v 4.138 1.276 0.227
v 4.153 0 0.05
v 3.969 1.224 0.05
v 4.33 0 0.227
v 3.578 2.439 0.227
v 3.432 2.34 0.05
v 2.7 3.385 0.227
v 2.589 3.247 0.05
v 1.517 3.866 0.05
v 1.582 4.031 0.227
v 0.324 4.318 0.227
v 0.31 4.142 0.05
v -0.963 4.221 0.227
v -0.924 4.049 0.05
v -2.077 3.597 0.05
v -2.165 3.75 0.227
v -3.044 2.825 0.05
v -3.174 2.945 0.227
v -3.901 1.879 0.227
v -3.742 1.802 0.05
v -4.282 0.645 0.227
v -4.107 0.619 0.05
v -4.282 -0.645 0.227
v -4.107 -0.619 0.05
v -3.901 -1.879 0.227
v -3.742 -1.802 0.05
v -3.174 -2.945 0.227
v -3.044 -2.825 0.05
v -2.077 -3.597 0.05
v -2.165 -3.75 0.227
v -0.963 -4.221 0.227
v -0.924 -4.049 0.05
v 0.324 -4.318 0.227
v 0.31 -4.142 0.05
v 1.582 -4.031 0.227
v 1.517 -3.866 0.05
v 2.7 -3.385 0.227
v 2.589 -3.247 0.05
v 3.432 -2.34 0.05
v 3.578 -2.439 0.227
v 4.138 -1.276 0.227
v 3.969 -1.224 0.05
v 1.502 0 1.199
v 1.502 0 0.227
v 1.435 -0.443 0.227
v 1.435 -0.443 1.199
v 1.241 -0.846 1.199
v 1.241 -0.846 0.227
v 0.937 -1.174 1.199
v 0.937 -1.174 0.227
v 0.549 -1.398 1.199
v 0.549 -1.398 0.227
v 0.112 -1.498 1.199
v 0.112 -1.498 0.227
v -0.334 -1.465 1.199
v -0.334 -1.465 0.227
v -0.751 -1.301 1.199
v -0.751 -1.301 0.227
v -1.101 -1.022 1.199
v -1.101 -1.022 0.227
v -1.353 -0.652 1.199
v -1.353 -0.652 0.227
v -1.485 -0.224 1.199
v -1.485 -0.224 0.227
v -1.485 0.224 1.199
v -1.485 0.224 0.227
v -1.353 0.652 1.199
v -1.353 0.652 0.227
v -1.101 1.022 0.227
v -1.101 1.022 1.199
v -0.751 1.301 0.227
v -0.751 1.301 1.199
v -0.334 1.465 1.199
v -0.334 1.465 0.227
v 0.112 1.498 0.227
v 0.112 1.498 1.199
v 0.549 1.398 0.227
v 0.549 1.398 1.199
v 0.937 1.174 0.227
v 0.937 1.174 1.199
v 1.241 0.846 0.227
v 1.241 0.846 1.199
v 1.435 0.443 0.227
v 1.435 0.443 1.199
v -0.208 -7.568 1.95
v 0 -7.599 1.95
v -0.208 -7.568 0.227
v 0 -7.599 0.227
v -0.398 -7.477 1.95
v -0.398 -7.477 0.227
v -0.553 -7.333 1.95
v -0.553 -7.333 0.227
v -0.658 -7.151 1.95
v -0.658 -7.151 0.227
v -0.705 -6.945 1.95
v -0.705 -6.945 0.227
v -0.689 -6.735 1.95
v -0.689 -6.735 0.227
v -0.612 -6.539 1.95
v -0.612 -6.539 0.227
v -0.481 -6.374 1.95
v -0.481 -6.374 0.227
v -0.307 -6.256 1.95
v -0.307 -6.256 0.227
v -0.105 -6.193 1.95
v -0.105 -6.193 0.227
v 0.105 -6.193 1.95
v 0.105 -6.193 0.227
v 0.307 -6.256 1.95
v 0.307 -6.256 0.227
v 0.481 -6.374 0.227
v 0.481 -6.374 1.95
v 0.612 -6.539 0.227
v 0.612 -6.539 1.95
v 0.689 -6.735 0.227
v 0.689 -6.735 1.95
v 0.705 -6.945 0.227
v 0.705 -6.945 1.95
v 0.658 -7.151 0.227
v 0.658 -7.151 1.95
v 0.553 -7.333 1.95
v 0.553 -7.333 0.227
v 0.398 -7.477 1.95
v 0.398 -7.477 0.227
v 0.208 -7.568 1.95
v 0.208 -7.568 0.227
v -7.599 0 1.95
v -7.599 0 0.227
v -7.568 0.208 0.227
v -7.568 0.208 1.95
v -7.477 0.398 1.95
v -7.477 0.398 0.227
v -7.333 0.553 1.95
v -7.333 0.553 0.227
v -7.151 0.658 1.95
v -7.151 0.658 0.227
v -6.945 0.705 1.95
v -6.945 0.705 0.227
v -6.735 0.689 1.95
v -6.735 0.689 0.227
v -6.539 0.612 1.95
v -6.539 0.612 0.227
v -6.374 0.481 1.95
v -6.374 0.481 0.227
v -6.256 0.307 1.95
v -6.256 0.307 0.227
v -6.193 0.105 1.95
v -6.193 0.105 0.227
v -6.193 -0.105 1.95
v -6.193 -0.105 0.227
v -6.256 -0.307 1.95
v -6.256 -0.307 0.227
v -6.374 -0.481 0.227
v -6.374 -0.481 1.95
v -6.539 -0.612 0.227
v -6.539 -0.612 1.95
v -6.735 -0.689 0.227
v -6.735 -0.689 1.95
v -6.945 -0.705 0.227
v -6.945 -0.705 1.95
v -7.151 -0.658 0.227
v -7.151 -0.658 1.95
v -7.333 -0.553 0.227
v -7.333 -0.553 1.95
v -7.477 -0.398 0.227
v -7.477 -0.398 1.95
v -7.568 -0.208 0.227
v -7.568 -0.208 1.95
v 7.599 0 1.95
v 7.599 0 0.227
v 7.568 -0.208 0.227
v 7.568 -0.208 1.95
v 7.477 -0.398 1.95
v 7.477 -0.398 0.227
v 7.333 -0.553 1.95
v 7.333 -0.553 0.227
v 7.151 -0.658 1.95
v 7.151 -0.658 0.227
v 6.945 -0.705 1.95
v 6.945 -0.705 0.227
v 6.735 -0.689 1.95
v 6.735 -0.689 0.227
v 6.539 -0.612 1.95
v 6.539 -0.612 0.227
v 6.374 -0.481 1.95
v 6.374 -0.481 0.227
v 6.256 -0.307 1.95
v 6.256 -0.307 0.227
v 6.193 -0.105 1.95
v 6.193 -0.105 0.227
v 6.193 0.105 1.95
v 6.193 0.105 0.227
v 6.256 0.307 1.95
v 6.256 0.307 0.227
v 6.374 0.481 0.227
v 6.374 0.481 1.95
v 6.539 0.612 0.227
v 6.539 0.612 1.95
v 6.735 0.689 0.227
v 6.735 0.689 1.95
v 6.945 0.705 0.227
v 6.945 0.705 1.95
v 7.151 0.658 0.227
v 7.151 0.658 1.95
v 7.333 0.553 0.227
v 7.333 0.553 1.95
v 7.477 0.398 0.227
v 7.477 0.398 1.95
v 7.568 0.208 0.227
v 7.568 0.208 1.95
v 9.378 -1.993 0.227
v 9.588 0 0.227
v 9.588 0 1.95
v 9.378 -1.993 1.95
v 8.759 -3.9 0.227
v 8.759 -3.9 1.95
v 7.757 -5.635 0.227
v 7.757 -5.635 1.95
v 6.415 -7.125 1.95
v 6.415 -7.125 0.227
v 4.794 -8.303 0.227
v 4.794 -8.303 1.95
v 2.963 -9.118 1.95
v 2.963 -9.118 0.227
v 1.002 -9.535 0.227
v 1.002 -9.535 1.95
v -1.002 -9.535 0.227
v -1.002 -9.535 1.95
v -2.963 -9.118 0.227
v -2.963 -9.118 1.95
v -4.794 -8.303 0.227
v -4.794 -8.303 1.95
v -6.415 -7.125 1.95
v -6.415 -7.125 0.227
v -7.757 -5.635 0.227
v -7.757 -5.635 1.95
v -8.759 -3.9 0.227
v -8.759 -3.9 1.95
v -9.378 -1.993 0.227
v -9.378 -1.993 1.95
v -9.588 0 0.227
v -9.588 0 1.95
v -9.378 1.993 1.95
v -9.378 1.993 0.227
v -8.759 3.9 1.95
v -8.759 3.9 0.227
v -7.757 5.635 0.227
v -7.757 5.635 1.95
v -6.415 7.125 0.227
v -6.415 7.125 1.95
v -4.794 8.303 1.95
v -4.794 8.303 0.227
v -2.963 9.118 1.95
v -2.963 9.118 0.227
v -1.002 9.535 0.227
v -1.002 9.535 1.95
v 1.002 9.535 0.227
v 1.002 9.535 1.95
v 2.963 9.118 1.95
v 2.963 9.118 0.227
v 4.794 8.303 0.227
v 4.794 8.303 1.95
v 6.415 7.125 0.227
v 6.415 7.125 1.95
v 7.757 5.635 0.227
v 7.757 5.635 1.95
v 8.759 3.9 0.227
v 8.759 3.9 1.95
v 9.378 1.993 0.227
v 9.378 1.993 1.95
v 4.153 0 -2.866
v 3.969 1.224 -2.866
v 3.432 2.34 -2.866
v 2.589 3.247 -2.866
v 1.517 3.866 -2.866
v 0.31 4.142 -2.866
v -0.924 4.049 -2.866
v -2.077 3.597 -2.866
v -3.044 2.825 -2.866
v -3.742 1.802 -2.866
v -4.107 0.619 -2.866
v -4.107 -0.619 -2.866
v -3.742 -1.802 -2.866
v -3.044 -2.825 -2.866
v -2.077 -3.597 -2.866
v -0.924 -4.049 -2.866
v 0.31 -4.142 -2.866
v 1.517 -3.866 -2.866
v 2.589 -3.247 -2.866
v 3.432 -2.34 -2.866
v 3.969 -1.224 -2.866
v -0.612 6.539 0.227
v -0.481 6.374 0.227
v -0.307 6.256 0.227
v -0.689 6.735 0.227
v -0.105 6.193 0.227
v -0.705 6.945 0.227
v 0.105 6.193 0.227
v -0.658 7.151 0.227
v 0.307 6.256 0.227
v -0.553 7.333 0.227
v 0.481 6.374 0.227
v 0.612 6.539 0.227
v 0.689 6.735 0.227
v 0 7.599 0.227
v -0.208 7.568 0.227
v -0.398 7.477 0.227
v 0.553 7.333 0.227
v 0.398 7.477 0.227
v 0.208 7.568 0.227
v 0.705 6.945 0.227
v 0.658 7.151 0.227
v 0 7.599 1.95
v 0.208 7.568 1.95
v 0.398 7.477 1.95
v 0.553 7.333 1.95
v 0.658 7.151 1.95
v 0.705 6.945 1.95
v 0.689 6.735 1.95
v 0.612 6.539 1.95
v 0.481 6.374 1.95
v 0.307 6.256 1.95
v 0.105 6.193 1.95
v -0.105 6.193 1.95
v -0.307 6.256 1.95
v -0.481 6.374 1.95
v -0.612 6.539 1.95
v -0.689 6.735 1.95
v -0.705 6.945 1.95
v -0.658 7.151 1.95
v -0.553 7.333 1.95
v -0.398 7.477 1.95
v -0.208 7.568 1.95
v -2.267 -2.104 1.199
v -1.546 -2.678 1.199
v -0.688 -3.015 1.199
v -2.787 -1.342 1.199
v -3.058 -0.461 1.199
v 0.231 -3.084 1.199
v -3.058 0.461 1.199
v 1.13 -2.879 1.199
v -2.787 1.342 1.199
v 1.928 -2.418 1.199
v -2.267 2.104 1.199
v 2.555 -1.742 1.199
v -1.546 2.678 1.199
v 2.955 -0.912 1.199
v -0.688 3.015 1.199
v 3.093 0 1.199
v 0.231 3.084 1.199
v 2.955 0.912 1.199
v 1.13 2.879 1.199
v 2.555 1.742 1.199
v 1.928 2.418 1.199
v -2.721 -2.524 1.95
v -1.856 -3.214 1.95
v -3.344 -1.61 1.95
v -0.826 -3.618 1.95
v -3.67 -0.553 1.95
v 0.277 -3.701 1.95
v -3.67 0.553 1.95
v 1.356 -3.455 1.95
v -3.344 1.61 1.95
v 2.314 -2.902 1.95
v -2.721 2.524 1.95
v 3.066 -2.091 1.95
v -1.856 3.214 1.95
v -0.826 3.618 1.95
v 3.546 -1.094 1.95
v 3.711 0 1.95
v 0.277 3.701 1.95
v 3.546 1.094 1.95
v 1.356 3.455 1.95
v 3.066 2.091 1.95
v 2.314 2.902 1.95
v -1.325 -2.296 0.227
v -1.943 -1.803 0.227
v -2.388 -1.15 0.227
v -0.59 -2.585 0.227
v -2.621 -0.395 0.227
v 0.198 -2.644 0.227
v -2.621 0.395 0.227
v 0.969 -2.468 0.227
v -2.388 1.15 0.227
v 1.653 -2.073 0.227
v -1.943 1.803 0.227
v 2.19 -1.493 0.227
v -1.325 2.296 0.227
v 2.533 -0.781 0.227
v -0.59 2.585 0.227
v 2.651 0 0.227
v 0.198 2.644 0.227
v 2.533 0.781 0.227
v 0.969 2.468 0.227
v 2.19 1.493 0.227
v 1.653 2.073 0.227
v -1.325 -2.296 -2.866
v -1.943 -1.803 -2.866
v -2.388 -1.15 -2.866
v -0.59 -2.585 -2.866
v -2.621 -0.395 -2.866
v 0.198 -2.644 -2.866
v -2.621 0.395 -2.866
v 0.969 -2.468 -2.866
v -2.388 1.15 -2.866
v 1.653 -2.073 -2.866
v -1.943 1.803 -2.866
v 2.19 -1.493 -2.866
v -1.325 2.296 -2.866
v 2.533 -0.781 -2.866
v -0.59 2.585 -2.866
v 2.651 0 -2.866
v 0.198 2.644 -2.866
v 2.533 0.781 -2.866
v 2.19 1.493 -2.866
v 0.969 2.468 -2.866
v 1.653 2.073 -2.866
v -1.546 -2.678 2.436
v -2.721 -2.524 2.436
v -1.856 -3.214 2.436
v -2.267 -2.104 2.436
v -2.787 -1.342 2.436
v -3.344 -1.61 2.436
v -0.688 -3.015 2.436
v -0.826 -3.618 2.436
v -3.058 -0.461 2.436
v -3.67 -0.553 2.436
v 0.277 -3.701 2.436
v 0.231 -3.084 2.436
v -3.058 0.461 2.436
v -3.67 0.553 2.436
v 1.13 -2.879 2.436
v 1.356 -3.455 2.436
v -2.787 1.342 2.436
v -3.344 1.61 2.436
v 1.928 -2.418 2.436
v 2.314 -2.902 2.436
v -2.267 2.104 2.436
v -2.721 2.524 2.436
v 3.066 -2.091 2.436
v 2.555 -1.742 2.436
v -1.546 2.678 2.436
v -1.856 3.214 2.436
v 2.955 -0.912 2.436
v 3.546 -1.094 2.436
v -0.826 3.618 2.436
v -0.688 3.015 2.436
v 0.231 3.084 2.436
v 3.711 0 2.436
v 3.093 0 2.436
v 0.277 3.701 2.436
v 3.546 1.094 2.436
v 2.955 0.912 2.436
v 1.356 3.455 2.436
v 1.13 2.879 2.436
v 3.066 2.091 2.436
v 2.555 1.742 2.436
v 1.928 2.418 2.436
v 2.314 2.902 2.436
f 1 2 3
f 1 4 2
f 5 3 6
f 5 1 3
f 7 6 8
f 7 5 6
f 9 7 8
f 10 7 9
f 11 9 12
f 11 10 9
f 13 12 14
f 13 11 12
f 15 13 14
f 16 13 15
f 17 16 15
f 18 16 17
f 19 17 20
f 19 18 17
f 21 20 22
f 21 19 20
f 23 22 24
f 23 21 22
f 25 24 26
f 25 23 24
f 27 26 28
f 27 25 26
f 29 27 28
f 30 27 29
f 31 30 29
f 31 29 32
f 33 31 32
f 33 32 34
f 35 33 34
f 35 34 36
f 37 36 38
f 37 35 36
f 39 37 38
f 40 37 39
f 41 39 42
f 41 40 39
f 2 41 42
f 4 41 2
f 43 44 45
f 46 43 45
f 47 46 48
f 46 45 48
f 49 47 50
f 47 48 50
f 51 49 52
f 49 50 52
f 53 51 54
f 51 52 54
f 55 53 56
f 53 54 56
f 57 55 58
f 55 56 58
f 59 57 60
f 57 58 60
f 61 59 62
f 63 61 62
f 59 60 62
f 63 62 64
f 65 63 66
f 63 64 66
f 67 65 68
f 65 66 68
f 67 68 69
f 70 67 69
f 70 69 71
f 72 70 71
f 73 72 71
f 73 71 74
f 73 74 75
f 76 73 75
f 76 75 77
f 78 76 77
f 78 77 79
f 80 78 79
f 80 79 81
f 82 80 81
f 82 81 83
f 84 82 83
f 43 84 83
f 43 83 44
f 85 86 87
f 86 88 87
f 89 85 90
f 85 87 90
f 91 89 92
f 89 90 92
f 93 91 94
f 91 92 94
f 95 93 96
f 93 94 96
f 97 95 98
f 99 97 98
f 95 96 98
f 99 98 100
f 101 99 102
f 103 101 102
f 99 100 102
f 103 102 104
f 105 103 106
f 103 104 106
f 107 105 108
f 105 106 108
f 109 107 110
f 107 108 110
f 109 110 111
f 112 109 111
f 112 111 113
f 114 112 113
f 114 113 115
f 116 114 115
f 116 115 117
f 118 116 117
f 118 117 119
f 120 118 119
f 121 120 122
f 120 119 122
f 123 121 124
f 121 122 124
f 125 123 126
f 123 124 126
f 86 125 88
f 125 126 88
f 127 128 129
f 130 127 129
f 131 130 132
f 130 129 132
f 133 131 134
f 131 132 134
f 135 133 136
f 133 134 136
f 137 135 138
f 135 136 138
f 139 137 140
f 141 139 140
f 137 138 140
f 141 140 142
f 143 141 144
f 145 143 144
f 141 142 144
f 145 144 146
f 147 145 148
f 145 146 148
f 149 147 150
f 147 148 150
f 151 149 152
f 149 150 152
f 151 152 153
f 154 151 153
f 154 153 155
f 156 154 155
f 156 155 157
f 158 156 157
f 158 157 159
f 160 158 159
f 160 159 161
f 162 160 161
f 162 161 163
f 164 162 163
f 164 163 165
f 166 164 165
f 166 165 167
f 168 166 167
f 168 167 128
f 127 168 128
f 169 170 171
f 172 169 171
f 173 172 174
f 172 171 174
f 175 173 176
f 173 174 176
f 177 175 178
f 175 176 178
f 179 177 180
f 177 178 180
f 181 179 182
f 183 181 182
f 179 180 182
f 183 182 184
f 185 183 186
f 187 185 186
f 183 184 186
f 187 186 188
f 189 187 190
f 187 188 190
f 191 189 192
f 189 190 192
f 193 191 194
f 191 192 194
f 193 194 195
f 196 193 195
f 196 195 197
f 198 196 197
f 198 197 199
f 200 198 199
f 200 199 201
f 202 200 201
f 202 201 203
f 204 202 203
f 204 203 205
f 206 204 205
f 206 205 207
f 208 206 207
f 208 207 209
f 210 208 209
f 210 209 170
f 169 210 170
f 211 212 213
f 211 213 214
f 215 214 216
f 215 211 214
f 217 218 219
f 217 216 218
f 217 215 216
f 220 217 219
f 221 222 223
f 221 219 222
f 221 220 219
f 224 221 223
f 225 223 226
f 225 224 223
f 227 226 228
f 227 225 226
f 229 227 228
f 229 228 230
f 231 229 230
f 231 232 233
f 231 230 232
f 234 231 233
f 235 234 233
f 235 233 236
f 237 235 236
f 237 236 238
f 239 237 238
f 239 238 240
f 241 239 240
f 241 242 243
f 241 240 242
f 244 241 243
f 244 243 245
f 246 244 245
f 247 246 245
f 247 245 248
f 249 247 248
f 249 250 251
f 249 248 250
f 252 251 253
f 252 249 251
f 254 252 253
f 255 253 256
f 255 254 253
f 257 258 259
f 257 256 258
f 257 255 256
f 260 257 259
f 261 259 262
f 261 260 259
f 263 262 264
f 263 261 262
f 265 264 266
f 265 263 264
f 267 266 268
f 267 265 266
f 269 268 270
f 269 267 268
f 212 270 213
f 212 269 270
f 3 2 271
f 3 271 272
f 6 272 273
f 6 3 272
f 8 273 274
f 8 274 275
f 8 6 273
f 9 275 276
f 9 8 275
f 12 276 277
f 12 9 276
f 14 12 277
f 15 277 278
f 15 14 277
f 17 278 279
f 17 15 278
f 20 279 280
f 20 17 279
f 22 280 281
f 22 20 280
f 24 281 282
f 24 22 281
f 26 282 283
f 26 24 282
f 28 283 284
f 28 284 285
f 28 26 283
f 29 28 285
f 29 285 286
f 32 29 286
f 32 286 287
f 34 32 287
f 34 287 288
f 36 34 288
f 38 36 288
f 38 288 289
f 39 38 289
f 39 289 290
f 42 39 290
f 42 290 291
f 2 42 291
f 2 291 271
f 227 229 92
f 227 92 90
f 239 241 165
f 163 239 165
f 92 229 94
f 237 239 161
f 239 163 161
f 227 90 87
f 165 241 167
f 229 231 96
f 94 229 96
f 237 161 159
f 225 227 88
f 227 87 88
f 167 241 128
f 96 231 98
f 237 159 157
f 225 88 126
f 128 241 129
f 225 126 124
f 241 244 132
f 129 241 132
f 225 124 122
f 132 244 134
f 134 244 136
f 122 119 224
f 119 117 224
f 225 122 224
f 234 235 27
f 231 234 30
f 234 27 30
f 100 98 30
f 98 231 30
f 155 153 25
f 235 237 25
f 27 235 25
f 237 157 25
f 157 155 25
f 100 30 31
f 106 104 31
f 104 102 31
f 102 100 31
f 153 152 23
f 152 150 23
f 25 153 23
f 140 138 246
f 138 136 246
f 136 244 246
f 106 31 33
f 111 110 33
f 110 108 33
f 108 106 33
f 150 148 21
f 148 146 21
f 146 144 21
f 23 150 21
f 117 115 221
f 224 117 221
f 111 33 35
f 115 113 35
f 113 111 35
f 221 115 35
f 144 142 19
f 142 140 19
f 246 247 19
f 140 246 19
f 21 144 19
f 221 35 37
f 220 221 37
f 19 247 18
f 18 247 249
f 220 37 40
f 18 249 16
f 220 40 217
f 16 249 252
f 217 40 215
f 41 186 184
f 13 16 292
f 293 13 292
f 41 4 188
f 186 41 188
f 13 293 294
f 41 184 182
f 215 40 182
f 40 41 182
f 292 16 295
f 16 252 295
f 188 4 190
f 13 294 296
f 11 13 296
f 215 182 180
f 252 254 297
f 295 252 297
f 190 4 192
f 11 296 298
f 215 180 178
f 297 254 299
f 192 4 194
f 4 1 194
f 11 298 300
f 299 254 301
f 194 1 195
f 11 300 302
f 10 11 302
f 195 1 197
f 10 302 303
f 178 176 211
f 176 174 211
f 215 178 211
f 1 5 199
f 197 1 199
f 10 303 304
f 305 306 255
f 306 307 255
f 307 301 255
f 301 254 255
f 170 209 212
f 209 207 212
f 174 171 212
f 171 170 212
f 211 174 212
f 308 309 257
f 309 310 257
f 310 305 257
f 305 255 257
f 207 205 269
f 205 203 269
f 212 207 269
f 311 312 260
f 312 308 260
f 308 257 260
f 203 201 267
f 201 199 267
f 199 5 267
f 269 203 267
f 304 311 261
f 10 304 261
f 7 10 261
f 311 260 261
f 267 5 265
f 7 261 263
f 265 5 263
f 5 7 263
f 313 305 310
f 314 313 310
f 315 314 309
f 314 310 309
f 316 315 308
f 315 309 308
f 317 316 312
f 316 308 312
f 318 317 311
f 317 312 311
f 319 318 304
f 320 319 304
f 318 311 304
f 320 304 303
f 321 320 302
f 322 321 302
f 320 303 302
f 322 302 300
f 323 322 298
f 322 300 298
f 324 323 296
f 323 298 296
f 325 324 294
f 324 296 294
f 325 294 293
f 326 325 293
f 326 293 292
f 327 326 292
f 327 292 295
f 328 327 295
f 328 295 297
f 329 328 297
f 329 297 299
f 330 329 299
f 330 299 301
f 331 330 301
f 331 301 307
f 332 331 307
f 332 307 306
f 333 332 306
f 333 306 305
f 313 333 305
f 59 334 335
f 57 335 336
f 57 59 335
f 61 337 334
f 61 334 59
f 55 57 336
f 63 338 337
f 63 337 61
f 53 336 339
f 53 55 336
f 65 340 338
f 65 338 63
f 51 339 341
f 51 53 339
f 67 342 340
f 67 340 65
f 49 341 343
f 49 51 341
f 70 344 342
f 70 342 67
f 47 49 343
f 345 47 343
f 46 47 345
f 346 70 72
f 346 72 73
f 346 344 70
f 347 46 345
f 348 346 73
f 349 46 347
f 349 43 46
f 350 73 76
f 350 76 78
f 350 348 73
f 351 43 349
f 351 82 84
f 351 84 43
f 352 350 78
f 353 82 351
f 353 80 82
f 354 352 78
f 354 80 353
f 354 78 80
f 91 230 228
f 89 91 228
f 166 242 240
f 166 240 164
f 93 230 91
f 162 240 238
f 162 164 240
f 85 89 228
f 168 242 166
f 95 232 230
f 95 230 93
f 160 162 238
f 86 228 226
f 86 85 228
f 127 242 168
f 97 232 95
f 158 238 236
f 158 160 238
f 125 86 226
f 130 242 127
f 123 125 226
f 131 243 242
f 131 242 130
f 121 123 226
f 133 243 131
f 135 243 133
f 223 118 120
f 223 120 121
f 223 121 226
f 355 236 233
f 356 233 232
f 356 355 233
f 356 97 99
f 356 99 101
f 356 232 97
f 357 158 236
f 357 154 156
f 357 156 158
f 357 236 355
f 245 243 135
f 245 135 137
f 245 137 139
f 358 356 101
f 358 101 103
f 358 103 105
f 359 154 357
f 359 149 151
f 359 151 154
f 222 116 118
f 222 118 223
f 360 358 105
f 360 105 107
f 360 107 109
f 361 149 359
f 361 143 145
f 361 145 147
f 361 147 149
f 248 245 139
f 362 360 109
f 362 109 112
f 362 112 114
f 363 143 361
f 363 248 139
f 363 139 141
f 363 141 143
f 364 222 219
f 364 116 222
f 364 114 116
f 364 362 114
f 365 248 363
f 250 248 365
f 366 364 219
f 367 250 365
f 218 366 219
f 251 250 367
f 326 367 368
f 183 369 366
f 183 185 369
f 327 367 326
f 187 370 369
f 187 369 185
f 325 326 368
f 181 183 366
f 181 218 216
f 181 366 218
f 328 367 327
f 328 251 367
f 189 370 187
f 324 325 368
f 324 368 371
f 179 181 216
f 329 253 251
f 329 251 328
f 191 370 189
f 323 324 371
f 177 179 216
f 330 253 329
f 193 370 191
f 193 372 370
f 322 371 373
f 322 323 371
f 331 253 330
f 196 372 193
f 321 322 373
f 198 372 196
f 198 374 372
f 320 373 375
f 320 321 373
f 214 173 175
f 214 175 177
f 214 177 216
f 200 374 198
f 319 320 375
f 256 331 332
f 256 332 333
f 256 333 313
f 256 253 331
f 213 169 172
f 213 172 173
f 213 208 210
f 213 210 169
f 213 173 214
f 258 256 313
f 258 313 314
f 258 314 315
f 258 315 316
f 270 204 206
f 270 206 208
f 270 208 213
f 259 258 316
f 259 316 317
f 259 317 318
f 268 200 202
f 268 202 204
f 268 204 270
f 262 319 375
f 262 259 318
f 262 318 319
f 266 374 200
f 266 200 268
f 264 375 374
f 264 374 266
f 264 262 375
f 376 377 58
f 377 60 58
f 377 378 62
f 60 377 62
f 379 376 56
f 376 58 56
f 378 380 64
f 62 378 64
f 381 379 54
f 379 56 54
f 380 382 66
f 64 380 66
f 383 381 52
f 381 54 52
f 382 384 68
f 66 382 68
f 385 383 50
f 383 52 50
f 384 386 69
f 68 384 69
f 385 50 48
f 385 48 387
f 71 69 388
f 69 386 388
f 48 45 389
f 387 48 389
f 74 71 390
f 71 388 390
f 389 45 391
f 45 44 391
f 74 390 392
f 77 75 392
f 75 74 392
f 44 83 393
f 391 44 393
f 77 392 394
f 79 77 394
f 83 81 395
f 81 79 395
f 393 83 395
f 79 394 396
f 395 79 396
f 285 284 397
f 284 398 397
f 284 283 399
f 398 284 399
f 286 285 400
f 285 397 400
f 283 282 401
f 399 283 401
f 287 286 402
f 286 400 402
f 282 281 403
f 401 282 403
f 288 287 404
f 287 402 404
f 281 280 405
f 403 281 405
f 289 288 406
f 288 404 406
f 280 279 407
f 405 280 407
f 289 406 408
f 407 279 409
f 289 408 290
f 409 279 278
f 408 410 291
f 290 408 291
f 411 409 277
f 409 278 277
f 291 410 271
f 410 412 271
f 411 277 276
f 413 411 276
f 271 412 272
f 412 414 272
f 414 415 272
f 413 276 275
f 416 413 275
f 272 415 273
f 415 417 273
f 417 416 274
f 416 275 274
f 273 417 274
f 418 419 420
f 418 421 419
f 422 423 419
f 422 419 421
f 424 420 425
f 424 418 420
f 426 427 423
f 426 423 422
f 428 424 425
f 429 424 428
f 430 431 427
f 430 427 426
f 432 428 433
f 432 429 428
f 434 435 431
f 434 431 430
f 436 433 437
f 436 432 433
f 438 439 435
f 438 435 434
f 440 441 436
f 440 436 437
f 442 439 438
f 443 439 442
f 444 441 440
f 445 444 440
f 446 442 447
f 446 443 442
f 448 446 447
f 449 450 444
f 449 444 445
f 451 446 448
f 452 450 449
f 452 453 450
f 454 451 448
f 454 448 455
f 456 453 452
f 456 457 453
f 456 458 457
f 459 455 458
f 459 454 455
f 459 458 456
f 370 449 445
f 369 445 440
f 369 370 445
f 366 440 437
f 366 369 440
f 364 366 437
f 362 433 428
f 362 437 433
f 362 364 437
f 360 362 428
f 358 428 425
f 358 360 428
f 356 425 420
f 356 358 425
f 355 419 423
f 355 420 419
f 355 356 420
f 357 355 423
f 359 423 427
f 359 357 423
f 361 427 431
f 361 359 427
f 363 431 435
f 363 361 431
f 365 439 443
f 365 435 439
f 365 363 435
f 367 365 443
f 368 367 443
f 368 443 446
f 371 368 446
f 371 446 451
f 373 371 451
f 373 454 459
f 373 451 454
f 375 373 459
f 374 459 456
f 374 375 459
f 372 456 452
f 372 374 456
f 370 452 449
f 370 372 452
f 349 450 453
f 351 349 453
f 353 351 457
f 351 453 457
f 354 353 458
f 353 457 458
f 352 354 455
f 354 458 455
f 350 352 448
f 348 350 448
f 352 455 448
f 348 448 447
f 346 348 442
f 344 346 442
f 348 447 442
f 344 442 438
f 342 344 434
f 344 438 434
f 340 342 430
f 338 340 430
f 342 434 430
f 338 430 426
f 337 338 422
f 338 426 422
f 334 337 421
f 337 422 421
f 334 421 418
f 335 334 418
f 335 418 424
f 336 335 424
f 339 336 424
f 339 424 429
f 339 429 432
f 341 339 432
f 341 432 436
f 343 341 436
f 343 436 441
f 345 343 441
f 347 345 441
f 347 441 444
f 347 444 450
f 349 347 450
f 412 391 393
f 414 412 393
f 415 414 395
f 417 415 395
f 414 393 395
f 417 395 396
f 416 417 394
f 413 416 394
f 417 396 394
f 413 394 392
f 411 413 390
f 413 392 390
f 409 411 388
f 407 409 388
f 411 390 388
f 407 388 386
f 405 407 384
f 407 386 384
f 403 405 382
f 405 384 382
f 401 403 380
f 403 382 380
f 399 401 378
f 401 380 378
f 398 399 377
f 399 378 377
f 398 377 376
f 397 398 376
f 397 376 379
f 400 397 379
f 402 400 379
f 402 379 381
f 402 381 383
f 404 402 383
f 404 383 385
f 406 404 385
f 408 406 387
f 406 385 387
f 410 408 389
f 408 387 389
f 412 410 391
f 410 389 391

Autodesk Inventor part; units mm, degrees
sketch "スケッチ1" plane through (0, 0, 0) normal (0, 0, 1) x (1, 0, 0)
  circle A0 centre (0, 0) radius 10.85
  dimension "d0" = 21.7
extrude "押し出し1" add sketch "スケッチ1" along normal blind 1.95
sketch "スケッチ2" plane through (0, 0, 0) normal (0, 0, 1) x (1, 0, 0)
  circle A0 centre (0, 0) radius 4.7
  dimension "d3" = 9.4
extrude "押し出し2" add sketch "スケッチ2" against normal blind 3.5
sketch "スケッチ3" plane through (0, 0, 0) normal (0, 0, 1) x (1, 0, 0)
  circle A0 centre (0, 0) radius 3
  dimension "d6" = 6
extrude "押し出し3" cut sketch "スケッチ3" against normal blind 3.5
sketch "スケッチ4" plane through (0, 0, 0) normal (0, 0, 1) x (1, 0, 0)
  circle A0 centre (0, 0) radius 4.2
  dimension "d9" = 8.4
extrude "押し出し4" add sketch "スケッチ4" along normal blind 2.5
sketch "スケッチ5" plane through (0, 0, 2.5) normal (0, 0, 1) x (1, 0, 0)
  circle A0 centre (0, 0) radius 3.5
  dimension "d12" = 7
extrude "押し出し5" cut sketch "スケッチ5" against normal blind 1.4
sketch "スケッチ6" plane through (0, 0, 0) normal (0, 0, 1) x (1, 0, 0)
  circle A0 centre (0, 0) radius 1.7
  dimension "d15" = 3.4
extrude "押し出し6" cut sketch "スケッチ6" along normal through all
sketch "スケッチ7" plane through (0, 0, 0) normal (0, 0, 1) x (1, 0, 0)
  circle A0 centre (7.8, 0) radius 0.8
  point P0 (0, 0)
  dimension "d18" = 1.6
  dimension "d19" = 7.8
extrude "押し出し7" cut sketch "スケッチ7" along normal through all
pattern_circular "円形状パターン1" count 4 over 360 about axis through (0, 0, -10) along (0, 0, 1) of "押し出し7"
chamfer "面取り1" distance 0.2 angle 45 1 edges at (-4.7, 0, 0)
scale "尺度1" factors (0.8836555, 0.8836555, 0.8836555) then translate (0, 0, 0.2269) bodies 1
properties part number "HbServoHorn01"
